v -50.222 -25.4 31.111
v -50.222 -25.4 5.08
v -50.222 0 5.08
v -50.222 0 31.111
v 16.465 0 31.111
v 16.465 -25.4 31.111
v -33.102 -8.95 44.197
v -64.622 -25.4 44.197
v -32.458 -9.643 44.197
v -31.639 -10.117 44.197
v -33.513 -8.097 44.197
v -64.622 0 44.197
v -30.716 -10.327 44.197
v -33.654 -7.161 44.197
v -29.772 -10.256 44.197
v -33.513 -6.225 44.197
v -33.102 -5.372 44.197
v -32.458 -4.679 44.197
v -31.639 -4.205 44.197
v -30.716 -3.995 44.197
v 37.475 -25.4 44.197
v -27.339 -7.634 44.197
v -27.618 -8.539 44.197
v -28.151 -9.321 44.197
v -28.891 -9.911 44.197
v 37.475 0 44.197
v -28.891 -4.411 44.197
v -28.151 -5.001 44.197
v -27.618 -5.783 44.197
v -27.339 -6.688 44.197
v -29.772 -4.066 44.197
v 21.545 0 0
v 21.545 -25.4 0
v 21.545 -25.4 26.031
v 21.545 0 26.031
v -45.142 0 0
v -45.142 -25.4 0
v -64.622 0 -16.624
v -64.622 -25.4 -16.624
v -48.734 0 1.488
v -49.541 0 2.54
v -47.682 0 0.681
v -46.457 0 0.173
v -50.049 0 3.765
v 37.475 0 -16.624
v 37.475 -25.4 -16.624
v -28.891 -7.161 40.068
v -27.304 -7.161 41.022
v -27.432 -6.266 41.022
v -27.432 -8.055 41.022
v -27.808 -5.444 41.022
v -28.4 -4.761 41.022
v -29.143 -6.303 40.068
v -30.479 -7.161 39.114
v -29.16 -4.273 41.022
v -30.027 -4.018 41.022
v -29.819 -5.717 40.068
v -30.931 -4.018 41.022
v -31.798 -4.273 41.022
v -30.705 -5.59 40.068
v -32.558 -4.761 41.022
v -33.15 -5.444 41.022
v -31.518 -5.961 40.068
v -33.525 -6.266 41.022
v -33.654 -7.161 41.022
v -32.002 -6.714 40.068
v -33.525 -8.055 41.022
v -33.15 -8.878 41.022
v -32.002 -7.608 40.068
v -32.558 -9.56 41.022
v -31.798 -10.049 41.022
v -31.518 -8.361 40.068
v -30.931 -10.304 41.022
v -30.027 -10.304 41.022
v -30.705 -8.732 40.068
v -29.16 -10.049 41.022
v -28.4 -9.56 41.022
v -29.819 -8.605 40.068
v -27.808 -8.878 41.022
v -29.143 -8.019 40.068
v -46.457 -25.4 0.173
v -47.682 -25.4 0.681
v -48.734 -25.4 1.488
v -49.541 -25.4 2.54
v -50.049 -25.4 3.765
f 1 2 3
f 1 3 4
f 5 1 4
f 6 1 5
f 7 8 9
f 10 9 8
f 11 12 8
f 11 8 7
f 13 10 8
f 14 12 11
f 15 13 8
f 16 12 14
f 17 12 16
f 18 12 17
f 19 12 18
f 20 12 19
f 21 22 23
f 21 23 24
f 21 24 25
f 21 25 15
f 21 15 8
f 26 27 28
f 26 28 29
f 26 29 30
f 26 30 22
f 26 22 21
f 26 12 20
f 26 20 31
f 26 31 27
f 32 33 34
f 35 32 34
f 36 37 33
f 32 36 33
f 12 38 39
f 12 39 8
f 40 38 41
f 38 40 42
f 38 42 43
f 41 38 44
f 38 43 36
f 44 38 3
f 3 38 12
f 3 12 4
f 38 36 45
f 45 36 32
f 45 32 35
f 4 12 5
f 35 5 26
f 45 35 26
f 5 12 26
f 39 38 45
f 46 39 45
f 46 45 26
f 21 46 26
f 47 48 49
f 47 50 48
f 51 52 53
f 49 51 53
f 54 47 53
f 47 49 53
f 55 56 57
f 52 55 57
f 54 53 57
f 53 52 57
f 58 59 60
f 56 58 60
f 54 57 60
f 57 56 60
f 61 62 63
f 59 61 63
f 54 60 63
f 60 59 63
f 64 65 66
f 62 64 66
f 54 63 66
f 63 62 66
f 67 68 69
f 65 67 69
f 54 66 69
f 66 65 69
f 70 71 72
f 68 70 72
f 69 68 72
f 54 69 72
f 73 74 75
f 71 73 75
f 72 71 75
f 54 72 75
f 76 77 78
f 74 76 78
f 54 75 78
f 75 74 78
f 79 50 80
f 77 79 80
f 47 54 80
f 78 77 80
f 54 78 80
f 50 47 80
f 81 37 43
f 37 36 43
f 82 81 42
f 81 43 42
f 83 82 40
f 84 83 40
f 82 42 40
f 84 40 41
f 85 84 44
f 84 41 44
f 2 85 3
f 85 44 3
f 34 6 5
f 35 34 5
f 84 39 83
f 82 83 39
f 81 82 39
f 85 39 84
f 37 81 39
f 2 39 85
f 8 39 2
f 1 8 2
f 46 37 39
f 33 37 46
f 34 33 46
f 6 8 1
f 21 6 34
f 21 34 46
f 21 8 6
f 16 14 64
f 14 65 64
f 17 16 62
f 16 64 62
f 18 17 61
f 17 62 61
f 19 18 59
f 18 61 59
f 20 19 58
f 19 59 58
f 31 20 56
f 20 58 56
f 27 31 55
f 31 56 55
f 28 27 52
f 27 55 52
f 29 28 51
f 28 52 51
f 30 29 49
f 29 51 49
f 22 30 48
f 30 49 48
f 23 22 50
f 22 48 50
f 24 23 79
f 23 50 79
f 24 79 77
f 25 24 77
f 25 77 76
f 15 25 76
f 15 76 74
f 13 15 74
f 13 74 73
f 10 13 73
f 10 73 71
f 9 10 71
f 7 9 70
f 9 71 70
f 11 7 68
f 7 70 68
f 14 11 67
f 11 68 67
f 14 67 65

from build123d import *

# Parameters (mm, degrees)
F0_W     = 102.0963229239
F0_H     = 60.8206074685
F1_DEPTH = 25.4
F2_W     = 71.7670321465
F2_H     = 31.1110951006
F3_DEPTH = 25.401
F4_R     = 5.08
F5_SIZE  = 5.08
F7_D     = 6.35
F7_DEPTH = 3.175
F7_TIP   = 1.9077324654


with BuildPart() as f1:
    # F0 (on Front) → F1 (new body)
    with BuildSketch(Plane.XZ):
        with Locations((-13.5734956712, 13.7862348929)):
            Rectangle(F0_W, F0_H)
    extrude(amount=F1_DEPTH)

    # F2 (on face) → F3 (cut, through all)
    with BuildSketch(Plane.XZ.offset(25.4)):
        with Locations((-14.3382139504, 15.5555475503)):
            Rectangle(F2_W, F2_H)
    extrude(amount=-F3_DEPTH, mode=Mode.SUBTRACT)

    # F4
    f4_edges = [f1.edges().sort_by_distance(p)[0] for p in [
        (-50.22173, -12.7, 0),
    ]]
    fillet(f4_edges, radius=F4_R)

    # F5
    f5_edges = [f1.edges().sort_by_distance(p)[0] for p in [
        (21.545302, -12.7, 31.111095),
    ]]
    chamfer(f5_edges, length=F5_SIZE)

    # F7
    with Locations(Plane.XY.offset(44.1965386271)):
        with Locations((-30.4787158966, -7.1609793231)):
            Hole(F7_D / 2, depth=F7_DEPTH)
            with Locations((0, 0, -(F7_DEPTH + F7_TIP / 2))):  # 118° drill point
                Cone(0, F7_D / 2, F7_TIP, mode=Mode.SUBTRACT)


solid = f1.part
